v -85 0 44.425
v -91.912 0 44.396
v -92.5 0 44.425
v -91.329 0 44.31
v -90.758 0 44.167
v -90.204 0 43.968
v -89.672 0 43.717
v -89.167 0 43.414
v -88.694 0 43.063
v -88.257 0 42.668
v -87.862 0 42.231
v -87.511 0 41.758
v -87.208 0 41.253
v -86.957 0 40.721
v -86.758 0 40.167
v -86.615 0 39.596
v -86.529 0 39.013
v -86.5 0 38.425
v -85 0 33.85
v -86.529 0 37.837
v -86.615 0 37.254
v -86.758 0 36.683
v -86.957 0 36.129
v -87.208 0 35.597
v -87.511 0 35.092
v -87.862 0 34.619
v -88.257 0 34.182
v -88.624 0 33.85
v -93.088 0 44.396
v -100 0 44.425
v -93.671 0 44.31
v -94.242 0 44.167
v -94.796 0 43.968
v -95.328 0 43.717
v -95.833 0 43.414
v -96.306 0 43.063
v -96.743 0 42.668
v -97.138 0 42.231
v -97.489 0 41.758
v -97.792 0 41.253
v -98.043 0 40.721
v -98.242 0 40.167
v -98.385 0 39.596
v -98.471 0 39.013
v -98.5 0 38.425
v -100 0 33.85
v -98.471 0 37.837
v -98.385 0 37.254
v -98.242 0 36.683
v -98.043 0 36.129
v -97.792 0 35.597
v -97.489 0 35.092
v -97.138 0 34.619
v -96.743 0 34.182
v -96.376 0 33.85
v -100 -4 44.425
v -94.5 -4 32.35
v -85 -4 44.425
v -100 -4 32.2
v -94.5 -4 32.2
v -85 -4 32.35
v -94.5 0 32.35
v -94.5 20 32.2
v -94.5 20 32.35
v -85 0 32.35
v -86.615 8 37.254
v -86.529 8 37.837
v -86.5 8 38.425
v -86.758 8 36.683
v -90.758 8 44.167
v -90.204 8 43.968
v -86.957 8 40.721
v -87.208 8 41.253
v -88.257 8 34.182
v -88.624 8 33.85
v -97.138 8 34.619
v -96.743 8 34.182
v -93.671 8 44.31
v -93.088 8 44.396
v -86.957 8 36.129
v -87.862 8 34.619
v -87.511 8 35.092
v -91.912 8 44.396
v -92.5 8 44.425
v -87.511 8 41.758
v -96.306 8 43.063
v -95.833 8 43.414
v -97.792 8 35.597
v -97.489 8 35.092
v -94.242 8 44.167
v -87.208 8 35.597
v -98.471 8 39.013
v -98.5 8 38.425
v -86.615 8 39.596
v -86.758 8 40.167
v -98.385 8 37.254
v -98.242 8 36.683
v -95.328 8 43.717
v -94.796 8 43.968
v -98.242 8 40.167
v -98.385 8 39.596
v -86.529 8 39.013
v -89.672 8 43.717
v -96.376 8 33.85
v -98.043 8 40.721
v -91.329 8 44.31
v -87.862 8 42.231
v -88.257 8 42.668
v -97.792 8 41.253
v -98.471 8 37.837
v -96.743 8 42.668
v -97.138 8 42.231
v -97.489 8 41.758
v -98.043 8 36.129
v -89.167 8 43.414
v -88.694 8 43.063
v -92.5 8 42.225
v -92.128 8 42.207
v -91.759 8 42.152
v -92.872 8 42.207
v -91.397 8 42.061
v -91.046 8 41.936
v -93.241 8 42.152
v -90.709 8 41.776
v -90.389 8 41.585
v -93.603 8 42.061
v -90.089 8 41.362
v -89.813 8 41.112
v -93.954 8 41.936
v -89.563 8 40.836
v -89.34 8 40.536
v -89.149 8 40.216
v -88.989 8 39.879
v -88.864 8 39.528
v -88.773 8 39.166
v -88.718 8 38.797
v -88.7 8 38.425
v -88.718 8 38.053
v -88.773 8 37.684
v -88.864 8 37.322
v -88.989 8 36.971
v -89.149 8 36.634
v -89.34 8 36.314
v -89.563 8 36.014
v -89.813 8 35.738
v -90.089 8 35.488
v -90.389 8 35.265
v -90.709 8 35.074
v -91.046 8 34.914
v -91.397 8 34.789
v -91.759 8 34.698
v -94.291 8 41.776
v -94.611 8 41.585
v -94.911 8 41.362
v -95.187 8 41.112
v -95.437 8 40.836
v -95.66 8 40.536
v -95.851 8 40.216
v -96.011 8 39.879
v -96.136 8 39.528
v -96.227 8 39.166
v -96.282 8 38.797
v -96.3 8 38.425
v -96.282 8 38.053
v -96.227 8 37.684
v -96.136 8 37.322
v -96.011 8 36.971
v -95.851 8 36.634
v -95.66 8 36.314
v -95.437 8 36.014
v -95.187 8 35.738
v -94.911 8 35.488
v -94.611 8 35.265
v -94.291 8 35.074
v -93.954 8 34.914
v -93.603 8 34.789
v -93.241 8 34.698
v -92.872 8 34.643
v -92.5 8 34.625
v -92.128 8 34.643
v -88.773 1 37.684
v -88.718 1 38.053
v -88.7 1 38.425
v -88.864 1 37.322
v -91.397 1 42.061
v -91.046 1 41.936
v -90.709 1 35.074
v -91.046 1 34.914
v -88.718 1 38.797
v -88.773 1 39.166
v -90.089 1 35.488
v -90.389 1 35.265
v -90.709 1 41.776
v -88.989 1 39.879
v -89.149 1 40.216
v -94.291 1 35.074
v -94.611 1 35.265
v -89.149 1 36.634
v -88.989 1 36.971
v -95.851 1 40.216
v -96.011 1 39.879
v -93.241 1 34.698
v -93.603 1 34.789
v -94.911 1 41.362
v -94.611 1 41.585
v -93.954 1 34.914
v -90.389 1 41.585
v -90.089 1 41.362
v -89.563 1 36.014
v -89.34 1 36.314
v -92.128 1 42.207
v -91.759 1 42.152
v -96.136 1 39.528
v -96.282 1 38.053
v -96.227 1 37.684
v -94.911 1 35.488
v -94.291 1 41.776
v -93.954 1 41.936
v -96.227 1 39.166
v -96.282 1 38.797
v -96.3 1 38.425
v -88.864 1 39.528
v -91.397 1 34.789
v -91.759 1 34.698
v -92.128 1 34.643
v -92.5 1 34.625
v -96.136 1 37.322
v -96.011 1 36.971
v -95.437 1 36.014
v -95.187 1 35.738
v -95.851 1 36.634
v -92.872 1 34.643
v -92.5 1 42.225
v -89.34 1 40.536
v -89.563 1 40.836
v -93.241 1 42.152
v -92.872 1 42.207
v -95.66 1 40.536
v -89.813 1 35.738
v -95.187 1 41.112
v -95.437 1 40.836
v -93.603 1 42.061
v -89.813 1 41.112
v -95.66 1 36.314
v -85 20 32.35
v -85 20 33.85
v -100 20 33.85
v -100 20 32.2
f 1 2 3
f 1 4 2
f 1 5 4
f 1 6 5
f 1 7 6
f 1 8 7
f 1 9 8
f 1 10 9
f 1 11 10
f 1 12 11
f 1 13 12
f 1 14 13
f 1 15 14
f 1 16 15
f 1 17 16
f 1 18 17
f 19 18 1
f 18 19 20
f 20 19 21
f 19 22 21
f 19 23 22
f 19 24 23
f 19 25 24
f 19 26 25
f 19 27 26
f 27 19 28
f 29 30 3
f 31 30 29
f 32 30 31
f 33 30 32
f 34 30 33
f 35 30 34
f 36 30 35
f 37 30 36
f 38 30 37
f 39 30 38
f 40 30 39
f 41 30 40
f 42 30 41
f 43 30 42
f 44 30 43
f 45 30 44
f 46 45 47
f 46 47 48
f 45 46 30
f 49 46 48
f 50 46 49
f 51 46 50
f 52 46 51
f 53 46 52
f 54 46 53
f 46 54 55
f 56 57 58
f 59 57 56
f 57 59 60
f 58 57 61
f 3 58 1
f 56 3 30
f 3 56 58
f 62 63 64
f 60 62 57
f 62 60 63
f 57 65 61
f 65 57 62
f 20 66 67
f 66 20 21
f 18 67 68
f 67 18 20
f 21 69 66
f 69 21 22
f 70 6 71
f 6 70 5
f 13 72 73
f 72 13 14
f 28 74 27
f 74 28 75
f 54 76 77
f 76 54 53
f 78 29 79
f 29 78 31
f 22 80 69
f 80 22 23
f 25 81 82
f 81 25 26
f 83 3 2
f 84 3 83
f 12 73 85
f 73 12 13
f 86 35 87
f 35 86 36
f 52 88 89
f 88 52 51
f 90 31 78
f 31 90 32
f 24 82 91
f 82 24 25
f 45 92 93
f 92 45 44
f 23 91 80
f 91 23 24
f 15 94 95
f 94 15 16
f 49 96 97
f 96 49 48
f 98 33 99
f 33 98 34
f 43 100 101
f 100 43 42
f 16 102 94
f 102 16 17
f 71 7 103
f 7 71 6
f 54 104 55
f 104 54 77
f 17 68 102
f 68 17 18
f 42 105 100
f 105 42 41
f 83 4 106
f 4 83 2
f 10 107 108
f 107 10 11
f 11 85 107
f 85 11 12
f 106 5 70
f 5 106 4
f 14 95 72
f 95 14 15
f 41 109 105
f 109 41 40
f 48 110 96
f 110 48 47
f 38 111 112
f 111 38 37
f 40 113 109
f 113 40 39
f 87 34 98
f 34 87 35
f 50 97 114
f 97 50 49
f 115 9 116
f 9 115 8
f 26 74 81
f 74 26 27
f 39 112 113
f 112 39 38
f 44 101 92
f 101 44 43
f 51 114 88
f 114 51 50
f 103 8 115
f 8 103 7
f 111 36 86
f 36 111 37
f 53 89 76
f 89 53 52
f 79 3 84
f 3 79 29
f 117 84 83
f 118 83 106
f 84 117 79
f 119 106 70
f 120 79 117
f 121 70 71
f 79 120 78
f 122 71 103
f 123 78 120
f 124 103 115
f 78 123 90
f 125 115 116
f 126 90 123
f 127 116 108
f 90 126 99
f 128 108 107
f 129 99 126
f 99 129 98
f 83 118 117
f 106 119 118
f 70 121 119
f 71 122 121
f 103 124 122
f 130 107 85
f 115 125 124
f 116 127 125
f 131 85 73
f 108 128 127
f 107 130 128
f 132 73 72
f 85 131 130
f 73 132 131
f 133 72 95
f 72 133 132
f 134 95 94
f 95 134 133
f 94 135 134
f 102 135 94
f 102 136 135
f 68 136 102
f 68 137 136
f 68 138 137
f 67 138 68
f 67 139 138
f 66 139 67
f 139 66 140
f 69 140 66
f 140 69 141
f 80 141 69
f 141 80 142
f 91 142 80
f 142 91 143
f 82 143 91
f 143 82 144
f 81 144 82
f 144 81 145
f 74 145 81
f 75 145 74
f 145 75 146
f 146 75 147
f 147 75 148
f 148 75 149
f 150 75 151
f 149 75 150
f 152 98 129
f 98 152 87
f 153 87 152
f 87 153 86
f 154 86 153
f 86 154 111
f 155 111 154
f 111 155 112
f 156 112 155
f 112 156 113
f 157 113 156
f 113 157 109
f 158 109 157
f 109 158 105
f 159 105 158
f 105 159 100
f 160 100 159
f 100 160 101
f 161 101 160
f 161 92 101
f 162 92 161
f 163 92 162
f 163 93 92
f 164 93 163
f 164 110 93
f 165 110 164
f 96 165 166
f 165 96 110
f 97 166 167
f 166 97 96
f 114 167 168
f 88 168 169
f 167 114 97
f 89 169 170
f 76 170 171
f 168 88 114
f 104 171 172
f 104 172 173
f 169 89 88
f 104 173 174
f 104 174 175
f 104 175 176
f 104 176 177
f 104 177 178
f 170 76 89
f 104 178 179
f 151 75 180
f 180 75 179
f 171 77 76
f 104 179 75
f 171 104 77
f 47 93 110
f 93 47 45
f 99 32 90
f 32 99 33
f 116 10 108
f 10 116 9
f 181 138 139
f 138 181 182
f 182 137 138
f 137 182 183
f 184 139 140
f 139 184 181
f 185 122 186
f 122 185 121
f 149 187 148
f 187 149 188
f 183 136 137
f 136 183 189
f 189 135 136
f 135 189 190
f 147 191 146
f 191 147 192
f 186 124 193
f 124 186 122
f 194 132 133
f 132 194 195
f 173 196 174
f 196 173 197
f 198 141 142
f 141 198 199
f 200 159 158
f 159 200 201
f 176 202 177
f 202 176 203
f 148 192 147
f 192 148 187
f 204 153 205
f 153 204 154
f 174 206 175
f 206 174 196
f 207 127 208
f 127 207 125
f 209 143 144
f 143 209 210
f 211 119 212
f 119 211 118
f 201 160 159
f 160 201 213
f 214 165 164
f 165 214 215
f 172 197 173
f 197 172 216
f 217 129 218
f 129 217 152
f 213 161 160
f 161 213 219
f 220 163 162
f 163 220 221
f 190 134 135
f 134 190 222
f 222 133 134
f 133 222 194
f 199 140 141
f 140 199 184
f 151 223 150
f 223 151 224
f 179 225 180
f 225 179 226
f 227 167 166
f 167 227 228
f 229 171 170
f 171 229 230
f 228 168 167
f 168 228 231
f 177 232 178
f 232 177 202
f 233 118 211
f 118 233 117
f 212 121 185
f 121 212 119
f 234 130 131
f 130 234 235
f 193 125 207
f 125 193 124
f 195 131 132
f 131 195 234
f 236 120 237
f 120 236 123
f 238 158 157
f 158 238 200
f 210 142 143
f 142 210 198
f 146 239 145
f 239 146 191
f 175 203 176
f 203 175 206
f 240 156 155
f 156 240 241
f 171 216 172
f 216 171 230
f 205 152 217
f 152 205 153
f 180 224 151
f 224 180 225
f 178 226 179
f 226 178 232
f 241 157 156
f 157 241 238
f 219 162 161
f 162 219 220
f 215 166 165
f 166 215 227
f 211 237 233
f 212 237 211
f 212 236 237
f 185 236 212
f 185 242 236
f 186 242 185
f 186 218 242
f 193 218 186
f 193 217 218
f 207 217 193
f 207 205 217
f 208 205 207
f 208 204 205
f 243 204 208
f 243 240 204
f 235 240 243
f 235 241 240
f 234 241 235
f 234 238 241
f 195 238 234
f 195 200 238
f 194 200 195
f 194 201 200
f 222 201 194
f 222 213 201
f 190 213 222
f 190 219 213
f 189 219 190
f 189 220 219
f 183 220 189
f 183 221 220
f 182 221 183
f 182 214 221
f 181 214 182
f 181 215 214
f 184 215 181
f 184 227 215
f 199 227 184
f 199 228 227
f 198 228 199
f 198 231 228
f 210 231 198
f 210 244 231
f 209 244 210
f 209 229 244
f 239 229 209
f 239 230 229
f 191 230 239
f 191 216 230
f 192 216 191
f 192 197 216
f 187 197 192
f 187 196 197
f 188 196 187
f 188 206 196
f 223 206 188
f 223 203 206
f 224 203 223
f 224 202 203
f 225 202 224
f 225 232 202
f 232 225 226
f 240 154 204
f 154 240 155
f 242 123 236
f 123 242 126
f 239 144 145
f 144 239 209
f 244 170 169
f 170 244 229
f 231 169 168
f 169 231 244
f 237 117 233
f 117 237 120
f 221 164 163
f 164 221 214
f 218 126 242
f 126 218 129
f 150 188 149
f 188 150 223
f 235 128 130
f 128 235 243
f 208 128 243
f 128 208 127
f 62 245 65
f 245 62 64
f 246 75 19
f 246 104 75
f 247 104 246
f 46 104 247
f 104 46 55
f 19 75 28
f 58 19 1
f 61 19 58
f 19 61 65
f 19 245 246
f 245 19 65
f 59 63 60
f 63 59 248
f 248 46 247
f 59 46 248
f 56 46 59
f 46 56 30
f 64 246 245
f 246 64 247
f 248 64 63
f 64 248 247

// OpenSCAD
// SG8-C2 boss-only coupon: SG8-M6-B source, clipped, ID on the plate front (0.4 mm, reads correctly from the front)
// Lab Rax generic equipment tray + faceplate (wizard template).
// Faceplate derived from the Pi4 baseline; rack holes follow the four-corner layout of the user-supplied
// 1U blank plate (faceplate_mounting.json): EVERY rack unit gets 4 holes, never a single centre pair.
// The wizard appends override assignments at the end of this file.
// PROPOSED, UNVALIDATED: printed fit, strength and rack clearance are UNKNOWN.
$fn=48;
part="assembly";            // assembly, faceplate, tray, combined, rear_bracket
// Device envelope (mm). Origin of hole coordinates = device front-left corner, seen from above.
dev_w=85; dev_d=56; dev_h=20;
feet=[];                     // [[x,y,w,d,h],...] underside feet, device frame front-left origin
holes=[];                   // [[x,y],...] mounting hole centres
hole_d=2.7;                 // device mounting hole diameter
device_mount="inserts";     // inserts, pegs, clips, straps
standoff=6;                 // device lift above tray floor
insert_pilot=3.2;           // pilot for heat-set insert (inserts mode)
board_t=1.6;                // board/flange thickness (pegs, clips)
joint="screw";              // screw, single ("snap" retired 2026-10-19: too brittle; kept as history)
u=1;                        // faceplate height in rack units
keystones=[];               // [x,...] keystone centres on faceplate (X=0 centre)
// Keystone v2 (2026-10-19, now the fallback; see ks_style): re-modelled from measurements of Brian's reference keystone frame
// (14.5 x 16 opening was too narrow when printed). Opening 14.8 x 16.6 through the plate, plus a rear collar
// 19.8 x 27.85 reaching 9.2 mm behind the front face (bottom lip to 10.4) that carries the latch ramp and catches.
ks_w=14.8; ks_h=16.6;       // front opening
ks_ow=19.8; ks_ob=11.9; ks_ot=15.95; ks_od=9.2; ks_lip=10.4;  // collar width, below/above opening centre, depth
ports=[];                   // [[x,z,w,h,r],...] faceplate cut-outs, z from slot bottom, r=corner radius
front_gap=12;               // device front to faceplate rear face
margin=8;                   // tray border around device
dev_off_x=0;                // device left/right offset, mm from centred (+ = right, seen from the front)
dev_off_y=0;                // device front/back offset, mm added to front_gap (+ = toward the rear)
dev_rot=0;                  // device rotation seen from above: 0, 90, 180, 270 (90/270 swap width and depth)
rear_support=false;         // heavy/deep equipment: tray runs to the rear posts and screws to a rear bracket
coupon=[];                 // test coupon: [x0,x1,ymax] keeps only that slice of the part

// 4 mm plate (owner default 2026-10-18). Corner radius is limited by the four-corner holes:
// the reference holes sit 1.6 mm from the top/bottom edge, so larger corners would cut into them.
rack_pitch=44.45; plate_gap=0.05; legacy_slot_offset=1.225;
plate_bottom=plate_gap/2; plate_center=u*rack_pitch/2;
plate_w=252; plate_t=4; plate_r=2.5; plate_h=u*rack_pitch-plate_gap;
hole_x=118.2625; hole_dz=15.902;   // each U: holes at its centre ±hole_dz (6.323 / 38.127 above the slot bottom)
rack_depth=240;             // Lab Rax frame depth (front of front posts to back of rear posts)
nudge=0;                    // render-repair only: tiny size offset applied when OpenSCAD 2021 emits a sliver
sleeve=device_mount=="sleeve";
// PROPOSED sleeve defaults (mm); independent design, fit and strength UNKNOWN.
// Sleeve v2 options (task 36): defined before first use, because OpenSCAD evaluates a variable where it is first assigned.
sleeve_top=0.3; feet_style="pockets"; rear_floor_opening=false; insert_bosses=false;
sl_ride=0.5; sl_pilot_inside=2; sl_pilot_radius=2; sl_boss_outside=3; sl_boss_depth=12;
sl_pilot_offset=sl_pilot_inside+sl_pilot_radius; sl_boss_fn=48; sl_boss_r=(sl_pilot_radius+sl_boss_outside)/cos(180/sl_boss_fn);
foot_tracks=[]; foot_dips=[]; floor_cable_box=[];
groove_attach=0.8; v2_eps=0.1; v2_tol=0.000000001; floor_cable_r=2; slot_bottom=0;
floor_cable_min=10; floor_stop_clear=4; floor_joint_clear=3; floor_wall_clear=5; rear_floor_joint_half=9; rear_floor_joint_reach=11.3;
sl_side=0.5; sl_top=sleeve_top+(feet_style=="grooves"?sl_ride:0); sl_wall=6; sl_lip_w=10; sl_lip_t=1.5; sl_band=1.5; sl_stop_t=4; sl_stop_h=6;
foot_clearance=0.5; foot_extra_depth=0.3; foot_min_floor=0.8; foot_lip_t=3.0;
tray_t=3; floor_z=(device_mount=="flat"||sleeve)?0.5:7+legacy_slot_offset; tray_z=floor_z; // @flat-floor
assert(dev_rot==0||dev_rot==90||dev_rot==180||dev_rot==270,"dev_rot must be 0, 90, 180 or 270");
// Device footprint on the tray after rotation; the tray stays centred and grows to keep the margin.
fp_w=(dev_rot==90||dev_rot==270)?dev_d:dev_w; fp_d=(dev_rot==90||dev_rot==270)?dev_w:dev_d;
rack_inner_w=208; side_clear=2; max_tray=rack_inner_w-2*side_clear; // PROPOSED nominal opening / side clearance
tray_w=2*(abs(dev_off_x)+fp_w/2+(sleeve?max(margin,sl_side+sl_wall,insert_bosses?sl_side+sl_pilot_offset+sl_boss_r:0):margin)); tray_d=rear_support?rack_depth:sleeve?-plate_t+fp_d+margin:dev_off_y+fp_d+front_gap+margin;
tray_x=-tray_w/2; tray_y=0;
 // @flat-begin
assert(device_mount!="flat"||front_gap+dev_off_y>=6.2,"Flat corner stops need a front gap of at least 6.2 mm");
assert(device_mount!="flat"||joint!="screw"||front_gap+dev_off_y>=11.5,"Flat device must clear the front screw joint (front gap >= 11.5 mm)");
assert(device_mount!="flat"||!rear_support||front_gap+dev_off_y+fp_d<=rack_depth-11.5,"Flat device must clear the rear screw joint (rear gap >= 11.5 mm)");
 // @flat-end
dev_x=-fp_w/2+dev_off_x; dev_y=sleeve?-plate_t+1.3:front_gap+dev_off_y; floor_top=tray_z+tray_t;
assert(tray_w<=max_tray,str("This tray is ",tray_w," mm wide but the rack opening allows ",max_tray," mm (",rack_inner_w," mm minus ",side_clear," mm each side). Try Rotate 90 degrees, or reduce dev_off_x."));
assert(sleeve||dev_y>=0,str("Device moved into the faceplate: dev_off_y must be at least ",-front_gap));
assert(!rear_support||dev_y+fp_d+margin<=rack_depth,"Device moved past the rear posts; reduce dev_off_y");
// Device-frame point [x,y] (front-left origin, unrotated) -> footprint offset from [dev_x,dev_y].
function dp(p)=dev_rot==90?[dev_d-p[1],p[0]]:dev_rot==180?[dev_w-p[0],dev_d-p[1]]:dev_rot==270?[p[1],dev_w-p[0]]:p;
foot_h=(device_mount=="flat"||sleeve)?max([0,for(f=feet)f[4]]):0; foot_depth=foot_h>0?foot_h+foot_extra_depth:0;
sl_half=fp_w/2+sl_side; sl_bottom=floor_top; sl_window_top=sl_bottom+dev_h-foot_h+sl_top;  // case rests on the floor top; feet hang in pockets foot_extra_depth deeper
sl_lip=sl_window_top+(foot_h>0?foot_lip_t:sl_lip_t)<=u*rack_pitch?(foot_h>0?foot_lip_t:sl_lip_t):0;
sl_rear=dev_y+fp_d;
sl_joints=[dev_off_x-sl_half-(insert_bosses?sl_pilot_offset:sl_wall/2),dev_off_x+sl_half+(insert_bosses?sl_pilot_offset:sl_wall/2)];
sl_joint_z=[sl_bottom+3,sl_window_top-3];
assert(!sleeve||fp_d/4-plate_t-6>=8,"Sleeve depth must be at least 72 mm to keep strap slots clear of the front joint");
assert(!sleeve||sl_bottom-plate_bottom>=sl_band&&u*rack_pitch-plate_bottom-sl_window_top>=sl_band,str("Too tall for a flush window in ",u,"U; choose ",u+1,"U"));
assert(!sleeve||!rear_support||sl_rear+sl_stop_t<=rack_depth-11.5,"Sleeve rear stop must clear rear joint by 11.5 mm");
assert(!sleeve||joint!="screw"||sl_window_top-sl_bottom>=10,"Sleeve screw joint needs a window at least 10 mm tall");
jx=min(40,tray_w/2-12); joint_x=[-jx,jx];
tongue_w=12; tongue_depth=7; tongue_h=3; tongue_z=tray_z+3.5;
slot_clear=0.3; boss_d=9; m3_clear=3.4; joint_pilot=4.0;  // 4.0 = the printed, well-fitting Pi4 trial

module capsule2d(len=10,diam=7){hull(){translate([-(len-diam)/2,0])circle(d=diam);translate([(len-diam)/2,0])circle(d=diam);}}
module rrect(w,h,r){rr=min(r,w/2-0.01,h/2-0.01);if(rr<=0)square([w,h],center=true);else offset(r=rr)square([w-2*rr,h-2*rr],center=true);}
// Mirror front-of-tray features to the rear (about the rack's mid-depth).
module to_rear(){translate([0,rack_depth/2,0])mirror([0,1,0])translate([0,-rack_depth/2,0])children();}

// Faceplate outline seen from the front: 2D X = rack X, 2D Y = height Z.
// rear=true cuts the larger keystone pocket; plain=true leaves out keystones/ports (rear bracket).
module plate2d(rear=false,plain=false){
 difference(){
  hull()for(sx=[-1,1],sz=[-1,1])translate([sx*(plate_w/2-plate_r),plate_center+sz*(plate_h/2-plate_r)])circle(r=plate_r+nudge);
  for(i=[0:u-1],dz=[-hole_dz,hole_dz],x=[-hole_x,hole_x])translate([x,i*rack_pitch+rack_pitch/2+dz])capsule2d();
  if(!plain){
   if(sleeve)translate([dev_off_x,(sl_bottom+sl_window_top)/2])square([2*sl_half,sl_window_top-sl_bottom],center=true);
   for(p=ports)translate([p[0],p[1]])rrect(p[2],p[3],p[4]);
  }
 }
}
// Plate between y=y0 (front) and y0+t, built from the 2D outline (cleaner meshes than 3D cuts in OpenSCAD 2021).
module plate_layer(y0,t,rear=false,plain=false){translate([0,y0+t,0])rotate([90,0,0])linear_extrude(height=t)plate2d(rear,plain);}

module plate_joint_add(rear=false){
 if(joint=="screw"&&(!sleeve||rear)){
  for(x=joint_x)translate([x-tongue_w/2,0,tongue_z])cube([tongue_w,tongue_depth,tongue_h]);
  for(x=joint_x)translate([x,0,tray_z+14])rotate([-90,0,0])cylinder(d=boss_d,h=8);
 }
 if(joint=="snap") for(x=joint_x){
  // Cantilever arm under the tray floor; barb snaps up into a floor window.
  translate([x-4,0,tray_z-2])cube([8,16,2]);
  // Barb v2: square catch face toward the plate, ramp falling toward the rear so the tray, slid in
  // from the rear, cams the arm down until its window drops over the barb.
  translate([x-4,12,tray_z])hull(){cube([8,0.6,1.2]);cube([8,2.4,0.01]);}
 }
}
// Keystone collar behind the plate, and the jack-shaped cut through plate + collar.
// Profile in (d = depth behind front face, z from opening centre); X width is ks_w throughout.
module ks_collar(){for(x=keystones)translate([x-ks_ow/2,-plate_t,plate_center]){
 translate([0,0,-ks_ob])cube([ks_ow,ks_od,ks_ob+ks_ot]);
 translate([0,0,-ks_ob])cube([ks_ow,ks_lip,ks_ob-ks_h/2]);
}}
module ks_cut(){for(x=keystones)translate([x-ks_w/2,-plate_t,plate_center])rotate([90,0,90])linear_extrude(height=ks_w)
 polygon([[-1,-ks_h/2],[5.8,-ks_h/2],[5.8,-9.9],[9.2,-9.9],[9.2,-ks_h/2],[11,-ks_h/2],[11,11.6],[8.2,11.6],
          [8.2,ks_ot+1],[7.2,ks_ot+1],[7.2,13.6],[0.6,ks_h/2],[-1,ks_h/2]]);}
// Golden keystone (Brian, 2026-10-19): exact cross-sections of the keystone on Brian's SG108 faceplate, which fits
// perfectly in practice. Source: "10 inch shelf TP-Link SG108 Plus Keystone" by Goul (MakerWorld remix, BY-NC-SA),
// local/personal use only, never redistributed. Each band: [X from opening centre, width, polygons in source (Y, Z)]
// with source Y running down the plate (opening centre Y=25.09) and Z = depth (keystone face 0, plate back 4.08).
// The block replaces the plate within 21 x 33.5 mm around each keystone; front face sits 0.08 proud like the source.
ks_style="golden";          // golden (SG108 copy) or v2 (own measured rebuild, kept as fallback)
// Brian, 2026-10-19: the golden v3 print fit left/right well but had ~0.4 mm play up/down. ks_tight moves the
// bottom (hook-side) edge of the opening, its hook groove and lip up by this much; the latch side is unchanged.
ks_tight=0.2;  // Brian, 2026-10-19: v5 coupon (0.2) printed a perfect fit; v4 (0.4) was too tight.
KS_GOLD=[
  [-10.50,0.60,[[[45.500,4.080],[45.500,0.080],[38.691,0.080],[38.691,0.000],[7.251,0.000],[7.251,0.080],[1.000,0.080],[1.000,4.080],[1.071,4.080]]]],
  [-9.90,0.98,[[[9.143,4.080],[9.143,6.600],[9.205,7.147],[9.207,7.160],[9.226,7.216],[9.395,7.692],[9.679,8.145],[9.697,8.169],[10.075,8.546],[10.099,8.565],[10.551,8.848],[11.083,9.036],[11.643,9.100],[13.493,9.100],[14.293,9.900],[33.393,9.900],[33.893,10.400],[34.493,10.400],[35.054,10.336],[35.586,10.148],[36.038,9.865],[36.062,9.846],[36.439,9.469],[36.458,9.445],[36.742,8.992],[36.753,8.965],[36.930,8.460],[36.993,7.900],[36.993,4.080],[45.500,4.080],[45.500,0.080],[38.691,0.080],[38.691,0.000],[7.251,0.000],[7.251,0.080],[1.000,0.080],[1.000,4.080],[1.014,4.080]]]],
  [-8.92,1.52,[[[7.551,4.080],[7.551,2.250],[9.143,2.250],[9.143,6.600],[9.209,7.169],[9.367,7.620],[9.404,7.709],[9.658,8.114],[9.716,8.190],[9.755,8.229],[10.054,8.527],[10.130,8.586],[10.534,8.840],[10.623,8.876],[11.074,9.034],[11.643,9.100],[13.493,9.100],[14.293,9.900],[33.393,9.900],[33.893,10.400],[34.493,10.400],[35.063,10.334],[35.514,10.176],[35.603,10.140],[36.006,9.886],[36.083,9.827],[36.420,9.490],[36.479,9.414],[36.719,9.030],[36.737,9.000],[36.770,8.920],[36.927,8.469],[36.993,7.900],[36.993,2.250],[38.551,2.250],[38.551,4.080],[45.500,4.080],[45.500,0.080],[38.691,0.080],[38.691,0.000],[7.251,0.000],[7.251,0.080],[1.000,0.080],[1.000,4.080],[1.044,4.080]]]],
  [-7.40,14.80,[[[7.551,4.080],[7.551,2.250],[9.143,2.250],[9.143,6.600],[9.175,6.878],[9.229,7.247],[9.478,7.850],[9.876,8.368],[10.393,8.765],[10.996,9.015],[11.365,9.069],[11.643,9.100],[13.493,9.100],[13.493,8.100],[11.493,8.100],[11.493,7.200],[16.793,0.500],[16.793,0.000],[7.251,0.000],[7.251,0.080],[1.000,0.080],[1.000,4.080],[1.025,4.080]],[[45.500,4.080],[45.500,0.080],[38.691,0.080],[38.691,0.000],[33.393,0.000],[33.393,5.800],[34.993,5.800],[34.993,8.400],[33.393,8.400],[33.393,9.900],[33.893,10.400],[34.493,10.400],[34.771,10.369],[35.140,10.315],[35.743,10.065],[36.200,9.715],[36.261,9.668],[36.658,9.150],[36.908,8.547],[36.962,8.178],[36.993,7.900],[36.993,2.250],[38.551,2.250],[38.551,4.080],[42.555,4.080]]]],
  [7.40,2.50,[[[45.500,4.080],[45.500,0.080],[38.691,0.080],[38.691,0.000],[7.251,0.000],[7.251,0.080],[1.000,0.080],[1.000,4.080],[7.551,4.080],[7.551,2.250],[9.143,2.250],[9.143,6.600],[9.209,7.168],[9.370,7.630],[9.402,7.705],[9.662,8.120],[9.712,8.185],[9.927,8.400],[10.059,8.531],[10.124,8.582],[10.538,8.841],[10.614,8.873],[11.075,9.034],[11.643,9.100],[13.493,9.100],[14.293,9.900],[33.393,9.900],[33.893,10.400],[34.493,10.400],[35.062,10.335],[35.523,10.172],[35.599,10.141],[36.013,9.882],[36.078,9.831],[36.425,9.486],[36.474,9.420],[36.735,9.005],[36.767,8.930],[36.928,8.467],[36.993,7.900],[36.993,2.250],[38.551,2.250],[38.551,4.080],[42.599,4.080]]]],
  [9.90,0.60,[[[45.500,4.080],[45.500,0.080],[38.691,0.080],[38.691,0.000],[7.251,0.000],[7.251,0.080],[1.000,0.080],[1.000,4.080],[7.551,4.080],[7.551,2.250],[38.551,2.250],[38.551,4.080],[42.635,4.080]]]]
];
// Depths are shifted by -0.08 before polygon() and the 0.08 is added back in the 3D transform: OpenSCAD 2021 snaps 2D
// points to a 1/65536 mm grid, which put the plate-flush faces (Z 0.08 / 4.08) 0.0000134 mm off the plate and left a
// non-manifold sliver edge. Shifted, those faces sit at exactly 0 and 4.0 (on the grid); the shape is unchanged.
// The block is cut 0.1 mm oversize in height, then clipped in rack coordinates by the same box as ks_box_cut, so its
// top/bottom faces are the very same numbers as the plate opening (the transform alone landed them a hair off).
module ks_golden(){for(x=keystones)intersection(){
 translate([x,0,plate_center])multmatrix([[1,0,0,0],[0,0,1,-4],[0,-1,0,25.09],[0,0,0,1]])intersection(){
  union()for(b=KS_GOLD)translate([b[0],0,0])rotate([90,0,90])linear_extrude(height=b[1])for(pg=b[2])
   translate([b[1]>10&&min([for(q=pg)q[0]])>30?-ks_tight:0,0])polygon([for(q=pg)[q[0],q[1]-0.08]]);  // opening band, hook side
  translate([-10.5,25.09-18.6,-0.09])cube([21,33.7,10.42]);
 }
 translate([x-10.5,-plate_t-1,plate_center-15])cube([21,plate_t+16,33.5]);
}}
module ks_box_cut(){for(x=keystones)translate([x-10.5,-plate_t-0.01,plate_center-15])cube([21,plate_t+0.02,33.5]);}
module plate_joint_cut(rear=false){if(joint=="screw"&&(!sleeve||rear))for(x=joint_x)translate([x,-0.1,tray_z+14])rotate([-90,0,0])cylinder(d=joint_pilot,h=8.2);}

module faceplate(){
 union(){
  difference(){
   union(){
    plate_layer(-plate_t,plate_t);
    if(ks_style=="v2")ks_collar();
    plate_joint_add();
   }
   plate_joint_cut();
   if(false)for(x=sl_joints,z=sl_joint_z)translate([x,-plate_t-0.1,z])rotate([-90,0,0])cylinder(d=m3_clear,h=plate_t+0.2);
   if(ks_style=="v2")ks_cut(); else ks_box_cut();
   label_cut();
  }
  if(ks_style!="v2")ks_golden();
  top_bosses();
 }
}
// Plain plate on the rear posts (mirror of the faceplate, no openings) that the tray's rear end screws/snaps to.
module rear_bracket(){to_rear()difference(){union(){plate_layer(-plate_t,plate_t,false,true);plate_joint_add(true);}plate_joint_cut(true);}}

module device_features_add(){
 sleeve_v2_add();
 if(sleeve){
  for(side=[-1,1]){
   x=side<0?dev_off_x-sl_half-sl_wall:dev_off_x+sl_half;
   translate([x,0,floor_top])cube([sl_wall,sl_rear,sl_window_top-floor_top]);
   if(sl_lip>0)translate([side<0?x:dev_off_x+sl_half-min(sl_lip_w,sl_half),0,sl_window_top])cube([sl_wall+min(sl_lip_w,sl_half),sl_rear,sl_lip]);
  }
  translate([dev_x,sl_rear,floor_top])cube([fp_w,sl_stop_t,min(sl_stop_h,dev_h-foot_h)]);
 }

 // @flat-begin
 if(device_mount=="flat"){
  // Corner stops outside the footprint, with 0.2 mm nominal clearance. Retention UNKNOWN.
  for(x=[dev_x-6.2,dev_x+fp_w+0.2],y=[dev_y,dev_y+fp_d-min(6,fp_d)])
   translate([x,y,floor_top])cube([6,min(6,fp_d),min(6,dev_h-foot_h)]);
  for(x=[dev_x,dev_x+fp_w-min(6,fp_w)],y=[dev_y-6.2,dev_y+fp_d+0.2])
   translate([x,y,floor_top])cube([min(6,fp_w),6,min(6,dev_h-foot_h)]);
 }
 // @flat-end
 if(device_mount=="inserts")for(h=[for(q=holes)dp(q)])translate([dev_x+h[0],dev_y+h[1],floor_top])cylinder(d=max(insert_pilot+3.5,7),h=standoff);
 if(device_mount=="pegs")for(h=[for(q=holes)dp(q)])translate([dev_x+h[0],dev_y+h[1],floor_top]){
  cylinder(d=hole_d+3,h=standoff);
  translate([0,0,standoff])cylinder(d=hole_d-0.3,h=board_t+0.8);
  translate([0,0,standoff+board_t+0.8])cylinder(d1=hole_d-0.3,d2=hole_d-1,h=0.8);
 }
 if(device_mount=="clips"){
  // Support ledges at the four corners plus a flexing clip on each side.
  for(x=[dev_x-1,dev_x+fp_w-5],y=[dev_y-1,dev_y+fp_d-5])translate([x,y,floor_top])cube([6,6,standoff]);
  for(s=[-1,1])translate([s>0?dev_x+fp_w+0.2:dev_x-2.2,dev_y+fp_d/2-5,floor_top]){
   cube([2,10,standoff+board_t+2.5]);
   translate([s>0?-1.2:2,0,standoff+board_t+0.2])hull(){cube([1.2,10,1.6]);translate([s>0?1.2:0,0,1.6])cube([0.01,10,0.6]);}
  }
 }
}
module device_features_cut(){
 sleeve_v2_cut();
 if(false)for(x=sl_joints,z=sl_joint_z)translate([x,-0.1,z])rotate([-90,0,0])cylinder(d=joint_pilot,h=8.1);
 // Strap access through each wall at quarter-depth, clear of the front/rear joints.
 if(sleeve)for(side=[-1,1],y=[dev_y+fp_d*0.25,dev_y+fp_d*0.75])
  translate([side<0?dev_off_x-sl_half-sl_wall-0.1:dev_off_x+sl_half-0.1,y-6,floor_top-0.1])cube([sl_wall+0.2,12,3.1]);

 if(device_mount=="inserts")for(h=[for(q=holes)dp(q)])translate([dev_x+h[0],dev_y+h[1],floor_top+0.01])cylinder(d=insert_pilot,h=standoff+0.1);
 if(device_mount=="straps"||device_mount=="flat"||sleeve)for(x=[dev_x-5.5,dev_x+fp_w+2.5],y=[dev_y+fp_d*0.25,dev_y+fp_d*0.75])
  translate([x,y-6,tray_z-0.1])cube([3,12,tray_t+0.2]);
 // Blind pockets retain at least foot_min_floor; taller feet pass through the floor by design.
 if(feet_style!="grooves"&&foot_h>0&&(device_mount=="flat"||sleeve))for(f=feet){corners=[dp([f[0],f[1]]),dp([f[0]+f[2],f[1]]),dp([f[0],f[1]+f[3]]),dp([f[0]+f[2],f[1]+f[3]])];x0=dev_x+min([for(p=corners)p[0]])-foot_clearance;x1=dev_x+max([for(p=corners)p[0]])+foot_clearance;y0=dev_y+min([for(p=corners)p[1]])-foot_clearance;y1=dev_y+max([for(p=corners)p[1]])+foot_clearance;deep=f[4]+foot_extra_depth;
  translate([x0,y0,deep>tray_t-foot_min_floor?tray_z-0.1:floor_top-deep])cube([x1-x0,y1-y0,deep>tray_t-foot_min_floor?tray_t+0.2:deep+0.02]);}
}

module tray_joint_add(rear=false){
 if(joint=="screw"&&(!sleeve||rear)){
  for(x=joint_x) translate([x-9,0,tray_z+tray_t])cube([18,8,5]);
  for(x=joint_x)translate([x-7,8.3,tray_z+3])cube([14,3,19]);
  for(x=joint_x) for(side=[-1,1]) translate([x+side*6-1,0,0])
    hull(){translate([0,9,tray_z+2.7])cube([2,2,0.5]);
           translate([0,9,tray_z+8])cube([2,2,0.5]);
           translate([0,(device_mount=="flat"||sleeve)?9.5:20,tray_z+2.7])cube([2,2,0.5]);}
 }
}
module tray_joint_cut(rear=false){
 if(joint=="screw"&&(!sleeve||rear)){
  for(x=joint_x)translate([x-(tongue_w+slot_clear)/2,-0.1,tongue_z-slot_clear/2])cube([tongue_w+slot_clear,tongue_depth+slot_clear,tongue_h+slot_clear]);
  for(x=joint_x)translate([x,11.4,tray_z+14])rotate([90,0,0])cylinder(d=m3_clear,h=12);
 }
 if(joint=="snap")for(x=joint_x)translate([x-4.3,11.6,tray_z-0.1])cube([8.6,3.2,tray_t+0.2]);
}

module tray(){
 difference(){
  union(){
   translate([tray_x,tray_y,tray_z])cube([tray_w,tray_d,tray_t]);
   tray_joint_add();
   if(rear_support)to_rear()tray_joint_add(true);
   device_features_add();
  }
  tray_joint_cut();
  if(rear_support)to_rear()tray_joint_cut(true);
  device_features_cut();
  detent_cut();
 }
}

module clip_coupon(){intersection(){children();translate([-100,-10,32.2])cube([15,30,13]);}}  // SG8-C2: boss only

clip_coupon(){
 if(part=="faceplate")difference(){faceplate();plate_id();}
 else if(part=="tray")difference(){union(){tray();detent_add();top_uprights();}tray_id();}
 else if(part=="rear_bracket")rear_bracket();
 else if(part=="combined")union(){faceplate();translate([tray_x,-0.01,tray_z])cube([tray_w,0.02+0.01,tray_t]);tray();if(rear_support)rear_bracket();}
 else {color("steelblue")faceplate();color("silver")tray();if(rear_support)color("steelblue")rear_bracket();
  %translate([dev_x,dev_y,floor_top+(device_mount=="inserts"||device_mount=="pegs"||device_mount=="clips"?standoff:0)-foot_h])cube([fp_w,fp_d,dev_h]);}
}
// @sleeve-v2-begin
// Opt-in geometry, derived analytically by equipment.py. Fit/retention/strength UNKNOWN.
assert(sleeve_top>=0.3&&sleeve_top<=2,"Top play must be 0.3 to 2 mm");
assert(feet_style=="pockets"||feet_style=="grooves","Feet must be pockets or grooves");
assert(feet_style!="grooves"||floor_top+dev_h-foot_h+sl_ride<=u*rack_pitch,"Sliding device must clear allocated U");
assert(feet_style!="grooves"||((sleeve||device_mount=="flat")&&len(feet)>0&&len(foot_tracks)>0),"Foot grooves need feet and derived tracks");
assert(!rear_floor_opening||(rear_support&&len(floor_cable_box)==4),"Cable opening needs rear support and a derived clear rectangle");
assert(!insert_bosses||(sleeve&&joint=="screw"),"Insert bosses need a sleeve and screw joint");
// Derived boxes also get conservative guards when the generated source is opened directly.
assert(!rear_floor_opening||(floor_cable_box[1]-floor_cable_box[0]>=floor_cable_min&&floor_cable_box[3]-floor_cable_box[2]>=floor_cable_min),"Not enough floor for cable opening");
assert(!rear_floor_opening||floor_cable_box[2]>=sl_rear+(sleeve?sl_stop_t:0)+floor_stop_clear,"Cable opening must clear rear stop");
assert(!rear_floor_opening||floor_cable_box[3]<=rack_depth-rear_floor_joint_reach-floor_joint_clear,"Cable opening must clear rear uprights");
assert(!rear_floor_opening||max([abs(floor_cable_box[0]),abs(floor_cable_box[1])])<=min([for(x=joint_x)abs(x)])-rear_floor_joint_half-floor_joint_clear,"Cable opening must clear rear tongues and bosses");
assert(!rear_floor_opening||!sleeve||(floor_cable_box[0]>=dev_off_x-sl_half+floor_wall_clear&&floor_cable_box[1]<=dev_off_x+sl_half-floor_wall_clear),"Cable opening must clear sleeve walls");
module sleeve_v2_add(){
 // Full-width slab down to the slot bottom so the underside stays flat on the print bed.
 if(feet_style=="grooves"&&len([for(t=foot_tracks)if(t[5]<tray_z)1])>0)translate([tray_x,tray_y,slot_bottom])cube([tray_w,tray_d,tray_z-slot_bottom+v2_eps]);
 if(feet_style=="grooves")for(t=foot_tracks){
  assert(floor_top-t[4]-t[5]+v2_tol>=foot_min_floor,"Grooves must retain 0.8 mm above slot bottom");
  // Grow downward only, with side webs joining the unchanged 3 mm floor.
  if(t[5]<tray_z)translate([t[0]-groove_attach,max(0,t[2]),t[5]])cube([t[1]-t[0]+2*groove_attach,t[3]-max(0,t[2]),floor_top-t[5]]);
 }
 if(insert_bosses)for(side=[-1,1],z=sl_joint_z)let(x=dev_off_x+side*(sl_half+sl_pilot_offset),inside=dev_off_x+side*sl_half)
  intersection(){
   translate([x,0,z])rotate([-90,0,0])cylinder(r=sl_boss_r,h=sl_boss_depth,$fn=sl_boss_fn);
   translate([side<0?inside-sl_pilot_offset-sl_boss_r:inside,0,tray_z])cube([sl_pilot_offset+sl_boss_r,sl_boss_depth,sl_window_top+sl_lip-tray_z]);
  }
}
module sleeve_v2_cut(){
 if(feet_style=="grooves"){
  for(t=foot_tracks)translate([t[0],t[2],floor_top-t[4]])cube([t[1]-t[0],t[3]-t[2],t[4]+v2_eps]);
  // Strap slots also pass through the slab.
  if(device_mount=="straps"||device_mount=="flat"||sleeve)for(x=[dev_x-5.5,dev_x+fp_w+2.5],y=[dev_y+fp_d*0.25,dev_y+fp_d*0.75])
   translate([x,y-6,slot_bottom-v2_eps])cube([3,12,tray_z-slot_bottom+2*v2_eps]);
  // Rotate an extruded Y/Z profile into X; both transitions have equal rise/run.
  for(p=foot_dips)translate([p[0],0,0])rotate([90,0,90])linear_extrude(height=p[1]-p[0])
   polygon([[p[2]-p[6],floor_top-p[5]],[p[2],floor_top-p[4]],[p[3],floor_top-p[4]],[p[3]+p[6],floor_top-p[5]],[p[3]+p[6],floor_top+v2_eps],[p[2]-p[6],floor_top+v2_eps]]);
 }
 if(rear_floor_opening)let(q=floor_cable_box)translate([(q[0]+q[1])/2,(q[2]+q[3])/2,slot_bottom-v2_eps])linear_extrude(height=floor_top-slot_bottom+2*v2_eps)rrect(q[1]-q[0],q[3]-q[2],floor_cable_r);
}
// @sleeve-v2-end

// Engraved front-face text [text, x, z centre, size]; 0.6 mm deep. Printed legibility UNKNOWN.
labels=[]; label_depth=0.6;
module label_cut(){for(l=labels)translate([l[1],-plate_t-0.1,l[2]])rotate([90,0,0])mirror([0,0,1])linear_extrude(height=label_depth+0.1)text(l[0],size=l[3],font="Liberation Sans:style=Bold",halign="center",valign="center");}

// Keyhole detents (Brian, 2026-10-23). Arm: 8 mm wide, 1.8 mm thick, 26 mm long, root toward the front, 1.2 mm slot around it.
// Bump: 5 mm wide, stands 2 mm above the floor (Brian, after KD-D 3 mm locked well; KD-E floor so the arm stays inside it); 45 deg ramp facing the front (switch rides over going in),
// 60 deg face toward the rear (catches the keyhole edge), 4 mm flat top centred on the keyhole.
// KD-E: 6.5 mm floor, arm hangs over a pocket so it stays inside the floor when bent.
key_y=-plate_t+1.3+48.5; key_x=[dev_off_x-55.0,dev_off_x+55.0];
arm_w=8; arm_t=1.8; arm_l=26; arm_gap=1.2; arm_end=key_y+5; arm_root=arm_end-arm_l;
bump_w=5; bump_up=2; bump_flat=4; tray_t=6.5; arm_z0=tray_t-1.2-arm_t; bump_base=tray_z+arm_z0+arm_t; bump_top=floor_top+bump_up; bump_hh=bump_top-bump_base;
module detent_cut(){for(x=key_x){
 difference(){translate([x-arm_w/2-arm_gap,arm_root,tray_z-0.1])cube([arm_w+2*arm_gap,arm_l+arm_gap,tray_t+0.2]);
  translate([x-arm_w/2,arm_root-0.1,tray_z-0.2])cube([arm_w,arm_l+0.1,tray_t+0.4]);}
 translate([x-arm_w/2-0.01,arm_root+3,bump_base])cube([arm_w+0.02,arm_l-3+0.01,tray_t]);
 translate([x-arm_w/2-0.01,arm_root+3,tray_z-0.1])cube([arm_w+0.02,arm_l-3+0.01,arm_z0+0.1]);}}
module detent_add(){for(x=key_x)translate([x-bump_w/2,0,0])rotate([90,0,90])linear_extrude(height=bump_w)
 polygon([[key_y-bump_flat/2-bump_hh,bump_base],[key_y-bump_flat/2,bump_top],[key_y+bump_flat/2,bump_top],[key_y+bump_flat/2+bump_hh*tan(30),bump_base]]);}

// Hidden screws, M6 version SG8-M6-B (bracket overhaul, 2026-10-28). Same places as the printed 2026-10-23 M3 version:
// two plate bosses above the window, two uprights on the sleeve top lips, screws driven from behind.
// Boss: 7.6 mm bore (rack post M6 insert hole), 7 mm deep, 11.2 mm across (all the height above the window allows),
// top clipped flush with the plate top. Upright: 16 wide, 6 thick, 6.6 clearance + 11.5 x 3.5 head counterbore
// (cut open where it leaves the upright), 2.5 mm under the head: M6 x 8 reaches ~5.2 mm into the insert. Fit/strength UNKNOWN.
hs_x=[dev_off_x-sl_half-sl_wall+8, dev_off_x+sl_half+sl_wall-8]; m6_bore=7.6; m6_clear=6.6; hs_d=12;
hs_z=min((sl_window_top+sl_lip+u*rack_pitch)/2, plate_bottom+plate_h-hs_d/2); hs_w=16; hs_gap=0.3; hs_t=6; hs_web=2.5;
module top_bosses(){for(x=hs_x)intersection(){translate([x,0,hs_z])rotate([-90,0,0])difference(){cylinder(d=hs_d,h=8,$fn=64);translate([0,0,1])cylinder(d=m6_bore,h=8,$fn=64);}
 translate([x-hs_d,-0.1,0])cube([2*hs_d,8.2,plate_bottom+plate_h]);}}
module top_uprights(){for(x=hs_x)difference(){translate([x-hs_w/2,8+hs_gap,sl_window_top])cube([hs_w,hs_t,u*rack_pitch-0.6-sl_window_top]);
 translate([x,8+hs_gap-0.1,hs_z])rotate([-90,0,0])cylinder(d=m6_clear,h=hs_t+0.2,$fn=48);
 translate([x,8+hs_gap+hs_web,hs_z])rotate([-90,0,0])cylinder(d=11.5,h=hs_t,$fn=64);}}
// Test-print ID SG8-M6-B, engraved 0.6 mm: plate back between the bosses, outside of the left sleeve wall.
module id_text(){text("SG8-M6-B",size=4,font="Liberation Sans:style=Bold",halign="center",valign="center");}
module plate_id(){translate([-92.5,-4.2,hs_z])rotate([90,0,0])mirror([1,0,0])mirror([1,0,0])linear_extrude(1,center=true)text("SG8-C2",size=2.6,font="Liberation Sans:style=Bold",halign="center",valign="center");}
module tray_id(){translate([dev_off_x-sl_half-sl_wall-0.01+0.6,sl_rear-20,sl_bottom+12])rotate([90,0,-90])linear_extrude(1)id_text();}

// ---- wizard overrides: TP-Link TL-SG108E
dev_w=158.0;
dev_d=100.0;
dev_h=25.0;
hole_d=2.7;
standoff=6.0;
insert_pilot=3.2;
board_t=1.6;
u=1;
holes=[];
keystones=[88.0];
device_mount="sleeve";
joint="screw";
rear_support=false;
coupon=[];
sleeve_top=0.35;
dev_off_x=-15.0;
tray_w=174.0;
tray_x=-102.0;
labels=[["UPLINK", 88.0, 3.8, 4.5]];
ports=[];
